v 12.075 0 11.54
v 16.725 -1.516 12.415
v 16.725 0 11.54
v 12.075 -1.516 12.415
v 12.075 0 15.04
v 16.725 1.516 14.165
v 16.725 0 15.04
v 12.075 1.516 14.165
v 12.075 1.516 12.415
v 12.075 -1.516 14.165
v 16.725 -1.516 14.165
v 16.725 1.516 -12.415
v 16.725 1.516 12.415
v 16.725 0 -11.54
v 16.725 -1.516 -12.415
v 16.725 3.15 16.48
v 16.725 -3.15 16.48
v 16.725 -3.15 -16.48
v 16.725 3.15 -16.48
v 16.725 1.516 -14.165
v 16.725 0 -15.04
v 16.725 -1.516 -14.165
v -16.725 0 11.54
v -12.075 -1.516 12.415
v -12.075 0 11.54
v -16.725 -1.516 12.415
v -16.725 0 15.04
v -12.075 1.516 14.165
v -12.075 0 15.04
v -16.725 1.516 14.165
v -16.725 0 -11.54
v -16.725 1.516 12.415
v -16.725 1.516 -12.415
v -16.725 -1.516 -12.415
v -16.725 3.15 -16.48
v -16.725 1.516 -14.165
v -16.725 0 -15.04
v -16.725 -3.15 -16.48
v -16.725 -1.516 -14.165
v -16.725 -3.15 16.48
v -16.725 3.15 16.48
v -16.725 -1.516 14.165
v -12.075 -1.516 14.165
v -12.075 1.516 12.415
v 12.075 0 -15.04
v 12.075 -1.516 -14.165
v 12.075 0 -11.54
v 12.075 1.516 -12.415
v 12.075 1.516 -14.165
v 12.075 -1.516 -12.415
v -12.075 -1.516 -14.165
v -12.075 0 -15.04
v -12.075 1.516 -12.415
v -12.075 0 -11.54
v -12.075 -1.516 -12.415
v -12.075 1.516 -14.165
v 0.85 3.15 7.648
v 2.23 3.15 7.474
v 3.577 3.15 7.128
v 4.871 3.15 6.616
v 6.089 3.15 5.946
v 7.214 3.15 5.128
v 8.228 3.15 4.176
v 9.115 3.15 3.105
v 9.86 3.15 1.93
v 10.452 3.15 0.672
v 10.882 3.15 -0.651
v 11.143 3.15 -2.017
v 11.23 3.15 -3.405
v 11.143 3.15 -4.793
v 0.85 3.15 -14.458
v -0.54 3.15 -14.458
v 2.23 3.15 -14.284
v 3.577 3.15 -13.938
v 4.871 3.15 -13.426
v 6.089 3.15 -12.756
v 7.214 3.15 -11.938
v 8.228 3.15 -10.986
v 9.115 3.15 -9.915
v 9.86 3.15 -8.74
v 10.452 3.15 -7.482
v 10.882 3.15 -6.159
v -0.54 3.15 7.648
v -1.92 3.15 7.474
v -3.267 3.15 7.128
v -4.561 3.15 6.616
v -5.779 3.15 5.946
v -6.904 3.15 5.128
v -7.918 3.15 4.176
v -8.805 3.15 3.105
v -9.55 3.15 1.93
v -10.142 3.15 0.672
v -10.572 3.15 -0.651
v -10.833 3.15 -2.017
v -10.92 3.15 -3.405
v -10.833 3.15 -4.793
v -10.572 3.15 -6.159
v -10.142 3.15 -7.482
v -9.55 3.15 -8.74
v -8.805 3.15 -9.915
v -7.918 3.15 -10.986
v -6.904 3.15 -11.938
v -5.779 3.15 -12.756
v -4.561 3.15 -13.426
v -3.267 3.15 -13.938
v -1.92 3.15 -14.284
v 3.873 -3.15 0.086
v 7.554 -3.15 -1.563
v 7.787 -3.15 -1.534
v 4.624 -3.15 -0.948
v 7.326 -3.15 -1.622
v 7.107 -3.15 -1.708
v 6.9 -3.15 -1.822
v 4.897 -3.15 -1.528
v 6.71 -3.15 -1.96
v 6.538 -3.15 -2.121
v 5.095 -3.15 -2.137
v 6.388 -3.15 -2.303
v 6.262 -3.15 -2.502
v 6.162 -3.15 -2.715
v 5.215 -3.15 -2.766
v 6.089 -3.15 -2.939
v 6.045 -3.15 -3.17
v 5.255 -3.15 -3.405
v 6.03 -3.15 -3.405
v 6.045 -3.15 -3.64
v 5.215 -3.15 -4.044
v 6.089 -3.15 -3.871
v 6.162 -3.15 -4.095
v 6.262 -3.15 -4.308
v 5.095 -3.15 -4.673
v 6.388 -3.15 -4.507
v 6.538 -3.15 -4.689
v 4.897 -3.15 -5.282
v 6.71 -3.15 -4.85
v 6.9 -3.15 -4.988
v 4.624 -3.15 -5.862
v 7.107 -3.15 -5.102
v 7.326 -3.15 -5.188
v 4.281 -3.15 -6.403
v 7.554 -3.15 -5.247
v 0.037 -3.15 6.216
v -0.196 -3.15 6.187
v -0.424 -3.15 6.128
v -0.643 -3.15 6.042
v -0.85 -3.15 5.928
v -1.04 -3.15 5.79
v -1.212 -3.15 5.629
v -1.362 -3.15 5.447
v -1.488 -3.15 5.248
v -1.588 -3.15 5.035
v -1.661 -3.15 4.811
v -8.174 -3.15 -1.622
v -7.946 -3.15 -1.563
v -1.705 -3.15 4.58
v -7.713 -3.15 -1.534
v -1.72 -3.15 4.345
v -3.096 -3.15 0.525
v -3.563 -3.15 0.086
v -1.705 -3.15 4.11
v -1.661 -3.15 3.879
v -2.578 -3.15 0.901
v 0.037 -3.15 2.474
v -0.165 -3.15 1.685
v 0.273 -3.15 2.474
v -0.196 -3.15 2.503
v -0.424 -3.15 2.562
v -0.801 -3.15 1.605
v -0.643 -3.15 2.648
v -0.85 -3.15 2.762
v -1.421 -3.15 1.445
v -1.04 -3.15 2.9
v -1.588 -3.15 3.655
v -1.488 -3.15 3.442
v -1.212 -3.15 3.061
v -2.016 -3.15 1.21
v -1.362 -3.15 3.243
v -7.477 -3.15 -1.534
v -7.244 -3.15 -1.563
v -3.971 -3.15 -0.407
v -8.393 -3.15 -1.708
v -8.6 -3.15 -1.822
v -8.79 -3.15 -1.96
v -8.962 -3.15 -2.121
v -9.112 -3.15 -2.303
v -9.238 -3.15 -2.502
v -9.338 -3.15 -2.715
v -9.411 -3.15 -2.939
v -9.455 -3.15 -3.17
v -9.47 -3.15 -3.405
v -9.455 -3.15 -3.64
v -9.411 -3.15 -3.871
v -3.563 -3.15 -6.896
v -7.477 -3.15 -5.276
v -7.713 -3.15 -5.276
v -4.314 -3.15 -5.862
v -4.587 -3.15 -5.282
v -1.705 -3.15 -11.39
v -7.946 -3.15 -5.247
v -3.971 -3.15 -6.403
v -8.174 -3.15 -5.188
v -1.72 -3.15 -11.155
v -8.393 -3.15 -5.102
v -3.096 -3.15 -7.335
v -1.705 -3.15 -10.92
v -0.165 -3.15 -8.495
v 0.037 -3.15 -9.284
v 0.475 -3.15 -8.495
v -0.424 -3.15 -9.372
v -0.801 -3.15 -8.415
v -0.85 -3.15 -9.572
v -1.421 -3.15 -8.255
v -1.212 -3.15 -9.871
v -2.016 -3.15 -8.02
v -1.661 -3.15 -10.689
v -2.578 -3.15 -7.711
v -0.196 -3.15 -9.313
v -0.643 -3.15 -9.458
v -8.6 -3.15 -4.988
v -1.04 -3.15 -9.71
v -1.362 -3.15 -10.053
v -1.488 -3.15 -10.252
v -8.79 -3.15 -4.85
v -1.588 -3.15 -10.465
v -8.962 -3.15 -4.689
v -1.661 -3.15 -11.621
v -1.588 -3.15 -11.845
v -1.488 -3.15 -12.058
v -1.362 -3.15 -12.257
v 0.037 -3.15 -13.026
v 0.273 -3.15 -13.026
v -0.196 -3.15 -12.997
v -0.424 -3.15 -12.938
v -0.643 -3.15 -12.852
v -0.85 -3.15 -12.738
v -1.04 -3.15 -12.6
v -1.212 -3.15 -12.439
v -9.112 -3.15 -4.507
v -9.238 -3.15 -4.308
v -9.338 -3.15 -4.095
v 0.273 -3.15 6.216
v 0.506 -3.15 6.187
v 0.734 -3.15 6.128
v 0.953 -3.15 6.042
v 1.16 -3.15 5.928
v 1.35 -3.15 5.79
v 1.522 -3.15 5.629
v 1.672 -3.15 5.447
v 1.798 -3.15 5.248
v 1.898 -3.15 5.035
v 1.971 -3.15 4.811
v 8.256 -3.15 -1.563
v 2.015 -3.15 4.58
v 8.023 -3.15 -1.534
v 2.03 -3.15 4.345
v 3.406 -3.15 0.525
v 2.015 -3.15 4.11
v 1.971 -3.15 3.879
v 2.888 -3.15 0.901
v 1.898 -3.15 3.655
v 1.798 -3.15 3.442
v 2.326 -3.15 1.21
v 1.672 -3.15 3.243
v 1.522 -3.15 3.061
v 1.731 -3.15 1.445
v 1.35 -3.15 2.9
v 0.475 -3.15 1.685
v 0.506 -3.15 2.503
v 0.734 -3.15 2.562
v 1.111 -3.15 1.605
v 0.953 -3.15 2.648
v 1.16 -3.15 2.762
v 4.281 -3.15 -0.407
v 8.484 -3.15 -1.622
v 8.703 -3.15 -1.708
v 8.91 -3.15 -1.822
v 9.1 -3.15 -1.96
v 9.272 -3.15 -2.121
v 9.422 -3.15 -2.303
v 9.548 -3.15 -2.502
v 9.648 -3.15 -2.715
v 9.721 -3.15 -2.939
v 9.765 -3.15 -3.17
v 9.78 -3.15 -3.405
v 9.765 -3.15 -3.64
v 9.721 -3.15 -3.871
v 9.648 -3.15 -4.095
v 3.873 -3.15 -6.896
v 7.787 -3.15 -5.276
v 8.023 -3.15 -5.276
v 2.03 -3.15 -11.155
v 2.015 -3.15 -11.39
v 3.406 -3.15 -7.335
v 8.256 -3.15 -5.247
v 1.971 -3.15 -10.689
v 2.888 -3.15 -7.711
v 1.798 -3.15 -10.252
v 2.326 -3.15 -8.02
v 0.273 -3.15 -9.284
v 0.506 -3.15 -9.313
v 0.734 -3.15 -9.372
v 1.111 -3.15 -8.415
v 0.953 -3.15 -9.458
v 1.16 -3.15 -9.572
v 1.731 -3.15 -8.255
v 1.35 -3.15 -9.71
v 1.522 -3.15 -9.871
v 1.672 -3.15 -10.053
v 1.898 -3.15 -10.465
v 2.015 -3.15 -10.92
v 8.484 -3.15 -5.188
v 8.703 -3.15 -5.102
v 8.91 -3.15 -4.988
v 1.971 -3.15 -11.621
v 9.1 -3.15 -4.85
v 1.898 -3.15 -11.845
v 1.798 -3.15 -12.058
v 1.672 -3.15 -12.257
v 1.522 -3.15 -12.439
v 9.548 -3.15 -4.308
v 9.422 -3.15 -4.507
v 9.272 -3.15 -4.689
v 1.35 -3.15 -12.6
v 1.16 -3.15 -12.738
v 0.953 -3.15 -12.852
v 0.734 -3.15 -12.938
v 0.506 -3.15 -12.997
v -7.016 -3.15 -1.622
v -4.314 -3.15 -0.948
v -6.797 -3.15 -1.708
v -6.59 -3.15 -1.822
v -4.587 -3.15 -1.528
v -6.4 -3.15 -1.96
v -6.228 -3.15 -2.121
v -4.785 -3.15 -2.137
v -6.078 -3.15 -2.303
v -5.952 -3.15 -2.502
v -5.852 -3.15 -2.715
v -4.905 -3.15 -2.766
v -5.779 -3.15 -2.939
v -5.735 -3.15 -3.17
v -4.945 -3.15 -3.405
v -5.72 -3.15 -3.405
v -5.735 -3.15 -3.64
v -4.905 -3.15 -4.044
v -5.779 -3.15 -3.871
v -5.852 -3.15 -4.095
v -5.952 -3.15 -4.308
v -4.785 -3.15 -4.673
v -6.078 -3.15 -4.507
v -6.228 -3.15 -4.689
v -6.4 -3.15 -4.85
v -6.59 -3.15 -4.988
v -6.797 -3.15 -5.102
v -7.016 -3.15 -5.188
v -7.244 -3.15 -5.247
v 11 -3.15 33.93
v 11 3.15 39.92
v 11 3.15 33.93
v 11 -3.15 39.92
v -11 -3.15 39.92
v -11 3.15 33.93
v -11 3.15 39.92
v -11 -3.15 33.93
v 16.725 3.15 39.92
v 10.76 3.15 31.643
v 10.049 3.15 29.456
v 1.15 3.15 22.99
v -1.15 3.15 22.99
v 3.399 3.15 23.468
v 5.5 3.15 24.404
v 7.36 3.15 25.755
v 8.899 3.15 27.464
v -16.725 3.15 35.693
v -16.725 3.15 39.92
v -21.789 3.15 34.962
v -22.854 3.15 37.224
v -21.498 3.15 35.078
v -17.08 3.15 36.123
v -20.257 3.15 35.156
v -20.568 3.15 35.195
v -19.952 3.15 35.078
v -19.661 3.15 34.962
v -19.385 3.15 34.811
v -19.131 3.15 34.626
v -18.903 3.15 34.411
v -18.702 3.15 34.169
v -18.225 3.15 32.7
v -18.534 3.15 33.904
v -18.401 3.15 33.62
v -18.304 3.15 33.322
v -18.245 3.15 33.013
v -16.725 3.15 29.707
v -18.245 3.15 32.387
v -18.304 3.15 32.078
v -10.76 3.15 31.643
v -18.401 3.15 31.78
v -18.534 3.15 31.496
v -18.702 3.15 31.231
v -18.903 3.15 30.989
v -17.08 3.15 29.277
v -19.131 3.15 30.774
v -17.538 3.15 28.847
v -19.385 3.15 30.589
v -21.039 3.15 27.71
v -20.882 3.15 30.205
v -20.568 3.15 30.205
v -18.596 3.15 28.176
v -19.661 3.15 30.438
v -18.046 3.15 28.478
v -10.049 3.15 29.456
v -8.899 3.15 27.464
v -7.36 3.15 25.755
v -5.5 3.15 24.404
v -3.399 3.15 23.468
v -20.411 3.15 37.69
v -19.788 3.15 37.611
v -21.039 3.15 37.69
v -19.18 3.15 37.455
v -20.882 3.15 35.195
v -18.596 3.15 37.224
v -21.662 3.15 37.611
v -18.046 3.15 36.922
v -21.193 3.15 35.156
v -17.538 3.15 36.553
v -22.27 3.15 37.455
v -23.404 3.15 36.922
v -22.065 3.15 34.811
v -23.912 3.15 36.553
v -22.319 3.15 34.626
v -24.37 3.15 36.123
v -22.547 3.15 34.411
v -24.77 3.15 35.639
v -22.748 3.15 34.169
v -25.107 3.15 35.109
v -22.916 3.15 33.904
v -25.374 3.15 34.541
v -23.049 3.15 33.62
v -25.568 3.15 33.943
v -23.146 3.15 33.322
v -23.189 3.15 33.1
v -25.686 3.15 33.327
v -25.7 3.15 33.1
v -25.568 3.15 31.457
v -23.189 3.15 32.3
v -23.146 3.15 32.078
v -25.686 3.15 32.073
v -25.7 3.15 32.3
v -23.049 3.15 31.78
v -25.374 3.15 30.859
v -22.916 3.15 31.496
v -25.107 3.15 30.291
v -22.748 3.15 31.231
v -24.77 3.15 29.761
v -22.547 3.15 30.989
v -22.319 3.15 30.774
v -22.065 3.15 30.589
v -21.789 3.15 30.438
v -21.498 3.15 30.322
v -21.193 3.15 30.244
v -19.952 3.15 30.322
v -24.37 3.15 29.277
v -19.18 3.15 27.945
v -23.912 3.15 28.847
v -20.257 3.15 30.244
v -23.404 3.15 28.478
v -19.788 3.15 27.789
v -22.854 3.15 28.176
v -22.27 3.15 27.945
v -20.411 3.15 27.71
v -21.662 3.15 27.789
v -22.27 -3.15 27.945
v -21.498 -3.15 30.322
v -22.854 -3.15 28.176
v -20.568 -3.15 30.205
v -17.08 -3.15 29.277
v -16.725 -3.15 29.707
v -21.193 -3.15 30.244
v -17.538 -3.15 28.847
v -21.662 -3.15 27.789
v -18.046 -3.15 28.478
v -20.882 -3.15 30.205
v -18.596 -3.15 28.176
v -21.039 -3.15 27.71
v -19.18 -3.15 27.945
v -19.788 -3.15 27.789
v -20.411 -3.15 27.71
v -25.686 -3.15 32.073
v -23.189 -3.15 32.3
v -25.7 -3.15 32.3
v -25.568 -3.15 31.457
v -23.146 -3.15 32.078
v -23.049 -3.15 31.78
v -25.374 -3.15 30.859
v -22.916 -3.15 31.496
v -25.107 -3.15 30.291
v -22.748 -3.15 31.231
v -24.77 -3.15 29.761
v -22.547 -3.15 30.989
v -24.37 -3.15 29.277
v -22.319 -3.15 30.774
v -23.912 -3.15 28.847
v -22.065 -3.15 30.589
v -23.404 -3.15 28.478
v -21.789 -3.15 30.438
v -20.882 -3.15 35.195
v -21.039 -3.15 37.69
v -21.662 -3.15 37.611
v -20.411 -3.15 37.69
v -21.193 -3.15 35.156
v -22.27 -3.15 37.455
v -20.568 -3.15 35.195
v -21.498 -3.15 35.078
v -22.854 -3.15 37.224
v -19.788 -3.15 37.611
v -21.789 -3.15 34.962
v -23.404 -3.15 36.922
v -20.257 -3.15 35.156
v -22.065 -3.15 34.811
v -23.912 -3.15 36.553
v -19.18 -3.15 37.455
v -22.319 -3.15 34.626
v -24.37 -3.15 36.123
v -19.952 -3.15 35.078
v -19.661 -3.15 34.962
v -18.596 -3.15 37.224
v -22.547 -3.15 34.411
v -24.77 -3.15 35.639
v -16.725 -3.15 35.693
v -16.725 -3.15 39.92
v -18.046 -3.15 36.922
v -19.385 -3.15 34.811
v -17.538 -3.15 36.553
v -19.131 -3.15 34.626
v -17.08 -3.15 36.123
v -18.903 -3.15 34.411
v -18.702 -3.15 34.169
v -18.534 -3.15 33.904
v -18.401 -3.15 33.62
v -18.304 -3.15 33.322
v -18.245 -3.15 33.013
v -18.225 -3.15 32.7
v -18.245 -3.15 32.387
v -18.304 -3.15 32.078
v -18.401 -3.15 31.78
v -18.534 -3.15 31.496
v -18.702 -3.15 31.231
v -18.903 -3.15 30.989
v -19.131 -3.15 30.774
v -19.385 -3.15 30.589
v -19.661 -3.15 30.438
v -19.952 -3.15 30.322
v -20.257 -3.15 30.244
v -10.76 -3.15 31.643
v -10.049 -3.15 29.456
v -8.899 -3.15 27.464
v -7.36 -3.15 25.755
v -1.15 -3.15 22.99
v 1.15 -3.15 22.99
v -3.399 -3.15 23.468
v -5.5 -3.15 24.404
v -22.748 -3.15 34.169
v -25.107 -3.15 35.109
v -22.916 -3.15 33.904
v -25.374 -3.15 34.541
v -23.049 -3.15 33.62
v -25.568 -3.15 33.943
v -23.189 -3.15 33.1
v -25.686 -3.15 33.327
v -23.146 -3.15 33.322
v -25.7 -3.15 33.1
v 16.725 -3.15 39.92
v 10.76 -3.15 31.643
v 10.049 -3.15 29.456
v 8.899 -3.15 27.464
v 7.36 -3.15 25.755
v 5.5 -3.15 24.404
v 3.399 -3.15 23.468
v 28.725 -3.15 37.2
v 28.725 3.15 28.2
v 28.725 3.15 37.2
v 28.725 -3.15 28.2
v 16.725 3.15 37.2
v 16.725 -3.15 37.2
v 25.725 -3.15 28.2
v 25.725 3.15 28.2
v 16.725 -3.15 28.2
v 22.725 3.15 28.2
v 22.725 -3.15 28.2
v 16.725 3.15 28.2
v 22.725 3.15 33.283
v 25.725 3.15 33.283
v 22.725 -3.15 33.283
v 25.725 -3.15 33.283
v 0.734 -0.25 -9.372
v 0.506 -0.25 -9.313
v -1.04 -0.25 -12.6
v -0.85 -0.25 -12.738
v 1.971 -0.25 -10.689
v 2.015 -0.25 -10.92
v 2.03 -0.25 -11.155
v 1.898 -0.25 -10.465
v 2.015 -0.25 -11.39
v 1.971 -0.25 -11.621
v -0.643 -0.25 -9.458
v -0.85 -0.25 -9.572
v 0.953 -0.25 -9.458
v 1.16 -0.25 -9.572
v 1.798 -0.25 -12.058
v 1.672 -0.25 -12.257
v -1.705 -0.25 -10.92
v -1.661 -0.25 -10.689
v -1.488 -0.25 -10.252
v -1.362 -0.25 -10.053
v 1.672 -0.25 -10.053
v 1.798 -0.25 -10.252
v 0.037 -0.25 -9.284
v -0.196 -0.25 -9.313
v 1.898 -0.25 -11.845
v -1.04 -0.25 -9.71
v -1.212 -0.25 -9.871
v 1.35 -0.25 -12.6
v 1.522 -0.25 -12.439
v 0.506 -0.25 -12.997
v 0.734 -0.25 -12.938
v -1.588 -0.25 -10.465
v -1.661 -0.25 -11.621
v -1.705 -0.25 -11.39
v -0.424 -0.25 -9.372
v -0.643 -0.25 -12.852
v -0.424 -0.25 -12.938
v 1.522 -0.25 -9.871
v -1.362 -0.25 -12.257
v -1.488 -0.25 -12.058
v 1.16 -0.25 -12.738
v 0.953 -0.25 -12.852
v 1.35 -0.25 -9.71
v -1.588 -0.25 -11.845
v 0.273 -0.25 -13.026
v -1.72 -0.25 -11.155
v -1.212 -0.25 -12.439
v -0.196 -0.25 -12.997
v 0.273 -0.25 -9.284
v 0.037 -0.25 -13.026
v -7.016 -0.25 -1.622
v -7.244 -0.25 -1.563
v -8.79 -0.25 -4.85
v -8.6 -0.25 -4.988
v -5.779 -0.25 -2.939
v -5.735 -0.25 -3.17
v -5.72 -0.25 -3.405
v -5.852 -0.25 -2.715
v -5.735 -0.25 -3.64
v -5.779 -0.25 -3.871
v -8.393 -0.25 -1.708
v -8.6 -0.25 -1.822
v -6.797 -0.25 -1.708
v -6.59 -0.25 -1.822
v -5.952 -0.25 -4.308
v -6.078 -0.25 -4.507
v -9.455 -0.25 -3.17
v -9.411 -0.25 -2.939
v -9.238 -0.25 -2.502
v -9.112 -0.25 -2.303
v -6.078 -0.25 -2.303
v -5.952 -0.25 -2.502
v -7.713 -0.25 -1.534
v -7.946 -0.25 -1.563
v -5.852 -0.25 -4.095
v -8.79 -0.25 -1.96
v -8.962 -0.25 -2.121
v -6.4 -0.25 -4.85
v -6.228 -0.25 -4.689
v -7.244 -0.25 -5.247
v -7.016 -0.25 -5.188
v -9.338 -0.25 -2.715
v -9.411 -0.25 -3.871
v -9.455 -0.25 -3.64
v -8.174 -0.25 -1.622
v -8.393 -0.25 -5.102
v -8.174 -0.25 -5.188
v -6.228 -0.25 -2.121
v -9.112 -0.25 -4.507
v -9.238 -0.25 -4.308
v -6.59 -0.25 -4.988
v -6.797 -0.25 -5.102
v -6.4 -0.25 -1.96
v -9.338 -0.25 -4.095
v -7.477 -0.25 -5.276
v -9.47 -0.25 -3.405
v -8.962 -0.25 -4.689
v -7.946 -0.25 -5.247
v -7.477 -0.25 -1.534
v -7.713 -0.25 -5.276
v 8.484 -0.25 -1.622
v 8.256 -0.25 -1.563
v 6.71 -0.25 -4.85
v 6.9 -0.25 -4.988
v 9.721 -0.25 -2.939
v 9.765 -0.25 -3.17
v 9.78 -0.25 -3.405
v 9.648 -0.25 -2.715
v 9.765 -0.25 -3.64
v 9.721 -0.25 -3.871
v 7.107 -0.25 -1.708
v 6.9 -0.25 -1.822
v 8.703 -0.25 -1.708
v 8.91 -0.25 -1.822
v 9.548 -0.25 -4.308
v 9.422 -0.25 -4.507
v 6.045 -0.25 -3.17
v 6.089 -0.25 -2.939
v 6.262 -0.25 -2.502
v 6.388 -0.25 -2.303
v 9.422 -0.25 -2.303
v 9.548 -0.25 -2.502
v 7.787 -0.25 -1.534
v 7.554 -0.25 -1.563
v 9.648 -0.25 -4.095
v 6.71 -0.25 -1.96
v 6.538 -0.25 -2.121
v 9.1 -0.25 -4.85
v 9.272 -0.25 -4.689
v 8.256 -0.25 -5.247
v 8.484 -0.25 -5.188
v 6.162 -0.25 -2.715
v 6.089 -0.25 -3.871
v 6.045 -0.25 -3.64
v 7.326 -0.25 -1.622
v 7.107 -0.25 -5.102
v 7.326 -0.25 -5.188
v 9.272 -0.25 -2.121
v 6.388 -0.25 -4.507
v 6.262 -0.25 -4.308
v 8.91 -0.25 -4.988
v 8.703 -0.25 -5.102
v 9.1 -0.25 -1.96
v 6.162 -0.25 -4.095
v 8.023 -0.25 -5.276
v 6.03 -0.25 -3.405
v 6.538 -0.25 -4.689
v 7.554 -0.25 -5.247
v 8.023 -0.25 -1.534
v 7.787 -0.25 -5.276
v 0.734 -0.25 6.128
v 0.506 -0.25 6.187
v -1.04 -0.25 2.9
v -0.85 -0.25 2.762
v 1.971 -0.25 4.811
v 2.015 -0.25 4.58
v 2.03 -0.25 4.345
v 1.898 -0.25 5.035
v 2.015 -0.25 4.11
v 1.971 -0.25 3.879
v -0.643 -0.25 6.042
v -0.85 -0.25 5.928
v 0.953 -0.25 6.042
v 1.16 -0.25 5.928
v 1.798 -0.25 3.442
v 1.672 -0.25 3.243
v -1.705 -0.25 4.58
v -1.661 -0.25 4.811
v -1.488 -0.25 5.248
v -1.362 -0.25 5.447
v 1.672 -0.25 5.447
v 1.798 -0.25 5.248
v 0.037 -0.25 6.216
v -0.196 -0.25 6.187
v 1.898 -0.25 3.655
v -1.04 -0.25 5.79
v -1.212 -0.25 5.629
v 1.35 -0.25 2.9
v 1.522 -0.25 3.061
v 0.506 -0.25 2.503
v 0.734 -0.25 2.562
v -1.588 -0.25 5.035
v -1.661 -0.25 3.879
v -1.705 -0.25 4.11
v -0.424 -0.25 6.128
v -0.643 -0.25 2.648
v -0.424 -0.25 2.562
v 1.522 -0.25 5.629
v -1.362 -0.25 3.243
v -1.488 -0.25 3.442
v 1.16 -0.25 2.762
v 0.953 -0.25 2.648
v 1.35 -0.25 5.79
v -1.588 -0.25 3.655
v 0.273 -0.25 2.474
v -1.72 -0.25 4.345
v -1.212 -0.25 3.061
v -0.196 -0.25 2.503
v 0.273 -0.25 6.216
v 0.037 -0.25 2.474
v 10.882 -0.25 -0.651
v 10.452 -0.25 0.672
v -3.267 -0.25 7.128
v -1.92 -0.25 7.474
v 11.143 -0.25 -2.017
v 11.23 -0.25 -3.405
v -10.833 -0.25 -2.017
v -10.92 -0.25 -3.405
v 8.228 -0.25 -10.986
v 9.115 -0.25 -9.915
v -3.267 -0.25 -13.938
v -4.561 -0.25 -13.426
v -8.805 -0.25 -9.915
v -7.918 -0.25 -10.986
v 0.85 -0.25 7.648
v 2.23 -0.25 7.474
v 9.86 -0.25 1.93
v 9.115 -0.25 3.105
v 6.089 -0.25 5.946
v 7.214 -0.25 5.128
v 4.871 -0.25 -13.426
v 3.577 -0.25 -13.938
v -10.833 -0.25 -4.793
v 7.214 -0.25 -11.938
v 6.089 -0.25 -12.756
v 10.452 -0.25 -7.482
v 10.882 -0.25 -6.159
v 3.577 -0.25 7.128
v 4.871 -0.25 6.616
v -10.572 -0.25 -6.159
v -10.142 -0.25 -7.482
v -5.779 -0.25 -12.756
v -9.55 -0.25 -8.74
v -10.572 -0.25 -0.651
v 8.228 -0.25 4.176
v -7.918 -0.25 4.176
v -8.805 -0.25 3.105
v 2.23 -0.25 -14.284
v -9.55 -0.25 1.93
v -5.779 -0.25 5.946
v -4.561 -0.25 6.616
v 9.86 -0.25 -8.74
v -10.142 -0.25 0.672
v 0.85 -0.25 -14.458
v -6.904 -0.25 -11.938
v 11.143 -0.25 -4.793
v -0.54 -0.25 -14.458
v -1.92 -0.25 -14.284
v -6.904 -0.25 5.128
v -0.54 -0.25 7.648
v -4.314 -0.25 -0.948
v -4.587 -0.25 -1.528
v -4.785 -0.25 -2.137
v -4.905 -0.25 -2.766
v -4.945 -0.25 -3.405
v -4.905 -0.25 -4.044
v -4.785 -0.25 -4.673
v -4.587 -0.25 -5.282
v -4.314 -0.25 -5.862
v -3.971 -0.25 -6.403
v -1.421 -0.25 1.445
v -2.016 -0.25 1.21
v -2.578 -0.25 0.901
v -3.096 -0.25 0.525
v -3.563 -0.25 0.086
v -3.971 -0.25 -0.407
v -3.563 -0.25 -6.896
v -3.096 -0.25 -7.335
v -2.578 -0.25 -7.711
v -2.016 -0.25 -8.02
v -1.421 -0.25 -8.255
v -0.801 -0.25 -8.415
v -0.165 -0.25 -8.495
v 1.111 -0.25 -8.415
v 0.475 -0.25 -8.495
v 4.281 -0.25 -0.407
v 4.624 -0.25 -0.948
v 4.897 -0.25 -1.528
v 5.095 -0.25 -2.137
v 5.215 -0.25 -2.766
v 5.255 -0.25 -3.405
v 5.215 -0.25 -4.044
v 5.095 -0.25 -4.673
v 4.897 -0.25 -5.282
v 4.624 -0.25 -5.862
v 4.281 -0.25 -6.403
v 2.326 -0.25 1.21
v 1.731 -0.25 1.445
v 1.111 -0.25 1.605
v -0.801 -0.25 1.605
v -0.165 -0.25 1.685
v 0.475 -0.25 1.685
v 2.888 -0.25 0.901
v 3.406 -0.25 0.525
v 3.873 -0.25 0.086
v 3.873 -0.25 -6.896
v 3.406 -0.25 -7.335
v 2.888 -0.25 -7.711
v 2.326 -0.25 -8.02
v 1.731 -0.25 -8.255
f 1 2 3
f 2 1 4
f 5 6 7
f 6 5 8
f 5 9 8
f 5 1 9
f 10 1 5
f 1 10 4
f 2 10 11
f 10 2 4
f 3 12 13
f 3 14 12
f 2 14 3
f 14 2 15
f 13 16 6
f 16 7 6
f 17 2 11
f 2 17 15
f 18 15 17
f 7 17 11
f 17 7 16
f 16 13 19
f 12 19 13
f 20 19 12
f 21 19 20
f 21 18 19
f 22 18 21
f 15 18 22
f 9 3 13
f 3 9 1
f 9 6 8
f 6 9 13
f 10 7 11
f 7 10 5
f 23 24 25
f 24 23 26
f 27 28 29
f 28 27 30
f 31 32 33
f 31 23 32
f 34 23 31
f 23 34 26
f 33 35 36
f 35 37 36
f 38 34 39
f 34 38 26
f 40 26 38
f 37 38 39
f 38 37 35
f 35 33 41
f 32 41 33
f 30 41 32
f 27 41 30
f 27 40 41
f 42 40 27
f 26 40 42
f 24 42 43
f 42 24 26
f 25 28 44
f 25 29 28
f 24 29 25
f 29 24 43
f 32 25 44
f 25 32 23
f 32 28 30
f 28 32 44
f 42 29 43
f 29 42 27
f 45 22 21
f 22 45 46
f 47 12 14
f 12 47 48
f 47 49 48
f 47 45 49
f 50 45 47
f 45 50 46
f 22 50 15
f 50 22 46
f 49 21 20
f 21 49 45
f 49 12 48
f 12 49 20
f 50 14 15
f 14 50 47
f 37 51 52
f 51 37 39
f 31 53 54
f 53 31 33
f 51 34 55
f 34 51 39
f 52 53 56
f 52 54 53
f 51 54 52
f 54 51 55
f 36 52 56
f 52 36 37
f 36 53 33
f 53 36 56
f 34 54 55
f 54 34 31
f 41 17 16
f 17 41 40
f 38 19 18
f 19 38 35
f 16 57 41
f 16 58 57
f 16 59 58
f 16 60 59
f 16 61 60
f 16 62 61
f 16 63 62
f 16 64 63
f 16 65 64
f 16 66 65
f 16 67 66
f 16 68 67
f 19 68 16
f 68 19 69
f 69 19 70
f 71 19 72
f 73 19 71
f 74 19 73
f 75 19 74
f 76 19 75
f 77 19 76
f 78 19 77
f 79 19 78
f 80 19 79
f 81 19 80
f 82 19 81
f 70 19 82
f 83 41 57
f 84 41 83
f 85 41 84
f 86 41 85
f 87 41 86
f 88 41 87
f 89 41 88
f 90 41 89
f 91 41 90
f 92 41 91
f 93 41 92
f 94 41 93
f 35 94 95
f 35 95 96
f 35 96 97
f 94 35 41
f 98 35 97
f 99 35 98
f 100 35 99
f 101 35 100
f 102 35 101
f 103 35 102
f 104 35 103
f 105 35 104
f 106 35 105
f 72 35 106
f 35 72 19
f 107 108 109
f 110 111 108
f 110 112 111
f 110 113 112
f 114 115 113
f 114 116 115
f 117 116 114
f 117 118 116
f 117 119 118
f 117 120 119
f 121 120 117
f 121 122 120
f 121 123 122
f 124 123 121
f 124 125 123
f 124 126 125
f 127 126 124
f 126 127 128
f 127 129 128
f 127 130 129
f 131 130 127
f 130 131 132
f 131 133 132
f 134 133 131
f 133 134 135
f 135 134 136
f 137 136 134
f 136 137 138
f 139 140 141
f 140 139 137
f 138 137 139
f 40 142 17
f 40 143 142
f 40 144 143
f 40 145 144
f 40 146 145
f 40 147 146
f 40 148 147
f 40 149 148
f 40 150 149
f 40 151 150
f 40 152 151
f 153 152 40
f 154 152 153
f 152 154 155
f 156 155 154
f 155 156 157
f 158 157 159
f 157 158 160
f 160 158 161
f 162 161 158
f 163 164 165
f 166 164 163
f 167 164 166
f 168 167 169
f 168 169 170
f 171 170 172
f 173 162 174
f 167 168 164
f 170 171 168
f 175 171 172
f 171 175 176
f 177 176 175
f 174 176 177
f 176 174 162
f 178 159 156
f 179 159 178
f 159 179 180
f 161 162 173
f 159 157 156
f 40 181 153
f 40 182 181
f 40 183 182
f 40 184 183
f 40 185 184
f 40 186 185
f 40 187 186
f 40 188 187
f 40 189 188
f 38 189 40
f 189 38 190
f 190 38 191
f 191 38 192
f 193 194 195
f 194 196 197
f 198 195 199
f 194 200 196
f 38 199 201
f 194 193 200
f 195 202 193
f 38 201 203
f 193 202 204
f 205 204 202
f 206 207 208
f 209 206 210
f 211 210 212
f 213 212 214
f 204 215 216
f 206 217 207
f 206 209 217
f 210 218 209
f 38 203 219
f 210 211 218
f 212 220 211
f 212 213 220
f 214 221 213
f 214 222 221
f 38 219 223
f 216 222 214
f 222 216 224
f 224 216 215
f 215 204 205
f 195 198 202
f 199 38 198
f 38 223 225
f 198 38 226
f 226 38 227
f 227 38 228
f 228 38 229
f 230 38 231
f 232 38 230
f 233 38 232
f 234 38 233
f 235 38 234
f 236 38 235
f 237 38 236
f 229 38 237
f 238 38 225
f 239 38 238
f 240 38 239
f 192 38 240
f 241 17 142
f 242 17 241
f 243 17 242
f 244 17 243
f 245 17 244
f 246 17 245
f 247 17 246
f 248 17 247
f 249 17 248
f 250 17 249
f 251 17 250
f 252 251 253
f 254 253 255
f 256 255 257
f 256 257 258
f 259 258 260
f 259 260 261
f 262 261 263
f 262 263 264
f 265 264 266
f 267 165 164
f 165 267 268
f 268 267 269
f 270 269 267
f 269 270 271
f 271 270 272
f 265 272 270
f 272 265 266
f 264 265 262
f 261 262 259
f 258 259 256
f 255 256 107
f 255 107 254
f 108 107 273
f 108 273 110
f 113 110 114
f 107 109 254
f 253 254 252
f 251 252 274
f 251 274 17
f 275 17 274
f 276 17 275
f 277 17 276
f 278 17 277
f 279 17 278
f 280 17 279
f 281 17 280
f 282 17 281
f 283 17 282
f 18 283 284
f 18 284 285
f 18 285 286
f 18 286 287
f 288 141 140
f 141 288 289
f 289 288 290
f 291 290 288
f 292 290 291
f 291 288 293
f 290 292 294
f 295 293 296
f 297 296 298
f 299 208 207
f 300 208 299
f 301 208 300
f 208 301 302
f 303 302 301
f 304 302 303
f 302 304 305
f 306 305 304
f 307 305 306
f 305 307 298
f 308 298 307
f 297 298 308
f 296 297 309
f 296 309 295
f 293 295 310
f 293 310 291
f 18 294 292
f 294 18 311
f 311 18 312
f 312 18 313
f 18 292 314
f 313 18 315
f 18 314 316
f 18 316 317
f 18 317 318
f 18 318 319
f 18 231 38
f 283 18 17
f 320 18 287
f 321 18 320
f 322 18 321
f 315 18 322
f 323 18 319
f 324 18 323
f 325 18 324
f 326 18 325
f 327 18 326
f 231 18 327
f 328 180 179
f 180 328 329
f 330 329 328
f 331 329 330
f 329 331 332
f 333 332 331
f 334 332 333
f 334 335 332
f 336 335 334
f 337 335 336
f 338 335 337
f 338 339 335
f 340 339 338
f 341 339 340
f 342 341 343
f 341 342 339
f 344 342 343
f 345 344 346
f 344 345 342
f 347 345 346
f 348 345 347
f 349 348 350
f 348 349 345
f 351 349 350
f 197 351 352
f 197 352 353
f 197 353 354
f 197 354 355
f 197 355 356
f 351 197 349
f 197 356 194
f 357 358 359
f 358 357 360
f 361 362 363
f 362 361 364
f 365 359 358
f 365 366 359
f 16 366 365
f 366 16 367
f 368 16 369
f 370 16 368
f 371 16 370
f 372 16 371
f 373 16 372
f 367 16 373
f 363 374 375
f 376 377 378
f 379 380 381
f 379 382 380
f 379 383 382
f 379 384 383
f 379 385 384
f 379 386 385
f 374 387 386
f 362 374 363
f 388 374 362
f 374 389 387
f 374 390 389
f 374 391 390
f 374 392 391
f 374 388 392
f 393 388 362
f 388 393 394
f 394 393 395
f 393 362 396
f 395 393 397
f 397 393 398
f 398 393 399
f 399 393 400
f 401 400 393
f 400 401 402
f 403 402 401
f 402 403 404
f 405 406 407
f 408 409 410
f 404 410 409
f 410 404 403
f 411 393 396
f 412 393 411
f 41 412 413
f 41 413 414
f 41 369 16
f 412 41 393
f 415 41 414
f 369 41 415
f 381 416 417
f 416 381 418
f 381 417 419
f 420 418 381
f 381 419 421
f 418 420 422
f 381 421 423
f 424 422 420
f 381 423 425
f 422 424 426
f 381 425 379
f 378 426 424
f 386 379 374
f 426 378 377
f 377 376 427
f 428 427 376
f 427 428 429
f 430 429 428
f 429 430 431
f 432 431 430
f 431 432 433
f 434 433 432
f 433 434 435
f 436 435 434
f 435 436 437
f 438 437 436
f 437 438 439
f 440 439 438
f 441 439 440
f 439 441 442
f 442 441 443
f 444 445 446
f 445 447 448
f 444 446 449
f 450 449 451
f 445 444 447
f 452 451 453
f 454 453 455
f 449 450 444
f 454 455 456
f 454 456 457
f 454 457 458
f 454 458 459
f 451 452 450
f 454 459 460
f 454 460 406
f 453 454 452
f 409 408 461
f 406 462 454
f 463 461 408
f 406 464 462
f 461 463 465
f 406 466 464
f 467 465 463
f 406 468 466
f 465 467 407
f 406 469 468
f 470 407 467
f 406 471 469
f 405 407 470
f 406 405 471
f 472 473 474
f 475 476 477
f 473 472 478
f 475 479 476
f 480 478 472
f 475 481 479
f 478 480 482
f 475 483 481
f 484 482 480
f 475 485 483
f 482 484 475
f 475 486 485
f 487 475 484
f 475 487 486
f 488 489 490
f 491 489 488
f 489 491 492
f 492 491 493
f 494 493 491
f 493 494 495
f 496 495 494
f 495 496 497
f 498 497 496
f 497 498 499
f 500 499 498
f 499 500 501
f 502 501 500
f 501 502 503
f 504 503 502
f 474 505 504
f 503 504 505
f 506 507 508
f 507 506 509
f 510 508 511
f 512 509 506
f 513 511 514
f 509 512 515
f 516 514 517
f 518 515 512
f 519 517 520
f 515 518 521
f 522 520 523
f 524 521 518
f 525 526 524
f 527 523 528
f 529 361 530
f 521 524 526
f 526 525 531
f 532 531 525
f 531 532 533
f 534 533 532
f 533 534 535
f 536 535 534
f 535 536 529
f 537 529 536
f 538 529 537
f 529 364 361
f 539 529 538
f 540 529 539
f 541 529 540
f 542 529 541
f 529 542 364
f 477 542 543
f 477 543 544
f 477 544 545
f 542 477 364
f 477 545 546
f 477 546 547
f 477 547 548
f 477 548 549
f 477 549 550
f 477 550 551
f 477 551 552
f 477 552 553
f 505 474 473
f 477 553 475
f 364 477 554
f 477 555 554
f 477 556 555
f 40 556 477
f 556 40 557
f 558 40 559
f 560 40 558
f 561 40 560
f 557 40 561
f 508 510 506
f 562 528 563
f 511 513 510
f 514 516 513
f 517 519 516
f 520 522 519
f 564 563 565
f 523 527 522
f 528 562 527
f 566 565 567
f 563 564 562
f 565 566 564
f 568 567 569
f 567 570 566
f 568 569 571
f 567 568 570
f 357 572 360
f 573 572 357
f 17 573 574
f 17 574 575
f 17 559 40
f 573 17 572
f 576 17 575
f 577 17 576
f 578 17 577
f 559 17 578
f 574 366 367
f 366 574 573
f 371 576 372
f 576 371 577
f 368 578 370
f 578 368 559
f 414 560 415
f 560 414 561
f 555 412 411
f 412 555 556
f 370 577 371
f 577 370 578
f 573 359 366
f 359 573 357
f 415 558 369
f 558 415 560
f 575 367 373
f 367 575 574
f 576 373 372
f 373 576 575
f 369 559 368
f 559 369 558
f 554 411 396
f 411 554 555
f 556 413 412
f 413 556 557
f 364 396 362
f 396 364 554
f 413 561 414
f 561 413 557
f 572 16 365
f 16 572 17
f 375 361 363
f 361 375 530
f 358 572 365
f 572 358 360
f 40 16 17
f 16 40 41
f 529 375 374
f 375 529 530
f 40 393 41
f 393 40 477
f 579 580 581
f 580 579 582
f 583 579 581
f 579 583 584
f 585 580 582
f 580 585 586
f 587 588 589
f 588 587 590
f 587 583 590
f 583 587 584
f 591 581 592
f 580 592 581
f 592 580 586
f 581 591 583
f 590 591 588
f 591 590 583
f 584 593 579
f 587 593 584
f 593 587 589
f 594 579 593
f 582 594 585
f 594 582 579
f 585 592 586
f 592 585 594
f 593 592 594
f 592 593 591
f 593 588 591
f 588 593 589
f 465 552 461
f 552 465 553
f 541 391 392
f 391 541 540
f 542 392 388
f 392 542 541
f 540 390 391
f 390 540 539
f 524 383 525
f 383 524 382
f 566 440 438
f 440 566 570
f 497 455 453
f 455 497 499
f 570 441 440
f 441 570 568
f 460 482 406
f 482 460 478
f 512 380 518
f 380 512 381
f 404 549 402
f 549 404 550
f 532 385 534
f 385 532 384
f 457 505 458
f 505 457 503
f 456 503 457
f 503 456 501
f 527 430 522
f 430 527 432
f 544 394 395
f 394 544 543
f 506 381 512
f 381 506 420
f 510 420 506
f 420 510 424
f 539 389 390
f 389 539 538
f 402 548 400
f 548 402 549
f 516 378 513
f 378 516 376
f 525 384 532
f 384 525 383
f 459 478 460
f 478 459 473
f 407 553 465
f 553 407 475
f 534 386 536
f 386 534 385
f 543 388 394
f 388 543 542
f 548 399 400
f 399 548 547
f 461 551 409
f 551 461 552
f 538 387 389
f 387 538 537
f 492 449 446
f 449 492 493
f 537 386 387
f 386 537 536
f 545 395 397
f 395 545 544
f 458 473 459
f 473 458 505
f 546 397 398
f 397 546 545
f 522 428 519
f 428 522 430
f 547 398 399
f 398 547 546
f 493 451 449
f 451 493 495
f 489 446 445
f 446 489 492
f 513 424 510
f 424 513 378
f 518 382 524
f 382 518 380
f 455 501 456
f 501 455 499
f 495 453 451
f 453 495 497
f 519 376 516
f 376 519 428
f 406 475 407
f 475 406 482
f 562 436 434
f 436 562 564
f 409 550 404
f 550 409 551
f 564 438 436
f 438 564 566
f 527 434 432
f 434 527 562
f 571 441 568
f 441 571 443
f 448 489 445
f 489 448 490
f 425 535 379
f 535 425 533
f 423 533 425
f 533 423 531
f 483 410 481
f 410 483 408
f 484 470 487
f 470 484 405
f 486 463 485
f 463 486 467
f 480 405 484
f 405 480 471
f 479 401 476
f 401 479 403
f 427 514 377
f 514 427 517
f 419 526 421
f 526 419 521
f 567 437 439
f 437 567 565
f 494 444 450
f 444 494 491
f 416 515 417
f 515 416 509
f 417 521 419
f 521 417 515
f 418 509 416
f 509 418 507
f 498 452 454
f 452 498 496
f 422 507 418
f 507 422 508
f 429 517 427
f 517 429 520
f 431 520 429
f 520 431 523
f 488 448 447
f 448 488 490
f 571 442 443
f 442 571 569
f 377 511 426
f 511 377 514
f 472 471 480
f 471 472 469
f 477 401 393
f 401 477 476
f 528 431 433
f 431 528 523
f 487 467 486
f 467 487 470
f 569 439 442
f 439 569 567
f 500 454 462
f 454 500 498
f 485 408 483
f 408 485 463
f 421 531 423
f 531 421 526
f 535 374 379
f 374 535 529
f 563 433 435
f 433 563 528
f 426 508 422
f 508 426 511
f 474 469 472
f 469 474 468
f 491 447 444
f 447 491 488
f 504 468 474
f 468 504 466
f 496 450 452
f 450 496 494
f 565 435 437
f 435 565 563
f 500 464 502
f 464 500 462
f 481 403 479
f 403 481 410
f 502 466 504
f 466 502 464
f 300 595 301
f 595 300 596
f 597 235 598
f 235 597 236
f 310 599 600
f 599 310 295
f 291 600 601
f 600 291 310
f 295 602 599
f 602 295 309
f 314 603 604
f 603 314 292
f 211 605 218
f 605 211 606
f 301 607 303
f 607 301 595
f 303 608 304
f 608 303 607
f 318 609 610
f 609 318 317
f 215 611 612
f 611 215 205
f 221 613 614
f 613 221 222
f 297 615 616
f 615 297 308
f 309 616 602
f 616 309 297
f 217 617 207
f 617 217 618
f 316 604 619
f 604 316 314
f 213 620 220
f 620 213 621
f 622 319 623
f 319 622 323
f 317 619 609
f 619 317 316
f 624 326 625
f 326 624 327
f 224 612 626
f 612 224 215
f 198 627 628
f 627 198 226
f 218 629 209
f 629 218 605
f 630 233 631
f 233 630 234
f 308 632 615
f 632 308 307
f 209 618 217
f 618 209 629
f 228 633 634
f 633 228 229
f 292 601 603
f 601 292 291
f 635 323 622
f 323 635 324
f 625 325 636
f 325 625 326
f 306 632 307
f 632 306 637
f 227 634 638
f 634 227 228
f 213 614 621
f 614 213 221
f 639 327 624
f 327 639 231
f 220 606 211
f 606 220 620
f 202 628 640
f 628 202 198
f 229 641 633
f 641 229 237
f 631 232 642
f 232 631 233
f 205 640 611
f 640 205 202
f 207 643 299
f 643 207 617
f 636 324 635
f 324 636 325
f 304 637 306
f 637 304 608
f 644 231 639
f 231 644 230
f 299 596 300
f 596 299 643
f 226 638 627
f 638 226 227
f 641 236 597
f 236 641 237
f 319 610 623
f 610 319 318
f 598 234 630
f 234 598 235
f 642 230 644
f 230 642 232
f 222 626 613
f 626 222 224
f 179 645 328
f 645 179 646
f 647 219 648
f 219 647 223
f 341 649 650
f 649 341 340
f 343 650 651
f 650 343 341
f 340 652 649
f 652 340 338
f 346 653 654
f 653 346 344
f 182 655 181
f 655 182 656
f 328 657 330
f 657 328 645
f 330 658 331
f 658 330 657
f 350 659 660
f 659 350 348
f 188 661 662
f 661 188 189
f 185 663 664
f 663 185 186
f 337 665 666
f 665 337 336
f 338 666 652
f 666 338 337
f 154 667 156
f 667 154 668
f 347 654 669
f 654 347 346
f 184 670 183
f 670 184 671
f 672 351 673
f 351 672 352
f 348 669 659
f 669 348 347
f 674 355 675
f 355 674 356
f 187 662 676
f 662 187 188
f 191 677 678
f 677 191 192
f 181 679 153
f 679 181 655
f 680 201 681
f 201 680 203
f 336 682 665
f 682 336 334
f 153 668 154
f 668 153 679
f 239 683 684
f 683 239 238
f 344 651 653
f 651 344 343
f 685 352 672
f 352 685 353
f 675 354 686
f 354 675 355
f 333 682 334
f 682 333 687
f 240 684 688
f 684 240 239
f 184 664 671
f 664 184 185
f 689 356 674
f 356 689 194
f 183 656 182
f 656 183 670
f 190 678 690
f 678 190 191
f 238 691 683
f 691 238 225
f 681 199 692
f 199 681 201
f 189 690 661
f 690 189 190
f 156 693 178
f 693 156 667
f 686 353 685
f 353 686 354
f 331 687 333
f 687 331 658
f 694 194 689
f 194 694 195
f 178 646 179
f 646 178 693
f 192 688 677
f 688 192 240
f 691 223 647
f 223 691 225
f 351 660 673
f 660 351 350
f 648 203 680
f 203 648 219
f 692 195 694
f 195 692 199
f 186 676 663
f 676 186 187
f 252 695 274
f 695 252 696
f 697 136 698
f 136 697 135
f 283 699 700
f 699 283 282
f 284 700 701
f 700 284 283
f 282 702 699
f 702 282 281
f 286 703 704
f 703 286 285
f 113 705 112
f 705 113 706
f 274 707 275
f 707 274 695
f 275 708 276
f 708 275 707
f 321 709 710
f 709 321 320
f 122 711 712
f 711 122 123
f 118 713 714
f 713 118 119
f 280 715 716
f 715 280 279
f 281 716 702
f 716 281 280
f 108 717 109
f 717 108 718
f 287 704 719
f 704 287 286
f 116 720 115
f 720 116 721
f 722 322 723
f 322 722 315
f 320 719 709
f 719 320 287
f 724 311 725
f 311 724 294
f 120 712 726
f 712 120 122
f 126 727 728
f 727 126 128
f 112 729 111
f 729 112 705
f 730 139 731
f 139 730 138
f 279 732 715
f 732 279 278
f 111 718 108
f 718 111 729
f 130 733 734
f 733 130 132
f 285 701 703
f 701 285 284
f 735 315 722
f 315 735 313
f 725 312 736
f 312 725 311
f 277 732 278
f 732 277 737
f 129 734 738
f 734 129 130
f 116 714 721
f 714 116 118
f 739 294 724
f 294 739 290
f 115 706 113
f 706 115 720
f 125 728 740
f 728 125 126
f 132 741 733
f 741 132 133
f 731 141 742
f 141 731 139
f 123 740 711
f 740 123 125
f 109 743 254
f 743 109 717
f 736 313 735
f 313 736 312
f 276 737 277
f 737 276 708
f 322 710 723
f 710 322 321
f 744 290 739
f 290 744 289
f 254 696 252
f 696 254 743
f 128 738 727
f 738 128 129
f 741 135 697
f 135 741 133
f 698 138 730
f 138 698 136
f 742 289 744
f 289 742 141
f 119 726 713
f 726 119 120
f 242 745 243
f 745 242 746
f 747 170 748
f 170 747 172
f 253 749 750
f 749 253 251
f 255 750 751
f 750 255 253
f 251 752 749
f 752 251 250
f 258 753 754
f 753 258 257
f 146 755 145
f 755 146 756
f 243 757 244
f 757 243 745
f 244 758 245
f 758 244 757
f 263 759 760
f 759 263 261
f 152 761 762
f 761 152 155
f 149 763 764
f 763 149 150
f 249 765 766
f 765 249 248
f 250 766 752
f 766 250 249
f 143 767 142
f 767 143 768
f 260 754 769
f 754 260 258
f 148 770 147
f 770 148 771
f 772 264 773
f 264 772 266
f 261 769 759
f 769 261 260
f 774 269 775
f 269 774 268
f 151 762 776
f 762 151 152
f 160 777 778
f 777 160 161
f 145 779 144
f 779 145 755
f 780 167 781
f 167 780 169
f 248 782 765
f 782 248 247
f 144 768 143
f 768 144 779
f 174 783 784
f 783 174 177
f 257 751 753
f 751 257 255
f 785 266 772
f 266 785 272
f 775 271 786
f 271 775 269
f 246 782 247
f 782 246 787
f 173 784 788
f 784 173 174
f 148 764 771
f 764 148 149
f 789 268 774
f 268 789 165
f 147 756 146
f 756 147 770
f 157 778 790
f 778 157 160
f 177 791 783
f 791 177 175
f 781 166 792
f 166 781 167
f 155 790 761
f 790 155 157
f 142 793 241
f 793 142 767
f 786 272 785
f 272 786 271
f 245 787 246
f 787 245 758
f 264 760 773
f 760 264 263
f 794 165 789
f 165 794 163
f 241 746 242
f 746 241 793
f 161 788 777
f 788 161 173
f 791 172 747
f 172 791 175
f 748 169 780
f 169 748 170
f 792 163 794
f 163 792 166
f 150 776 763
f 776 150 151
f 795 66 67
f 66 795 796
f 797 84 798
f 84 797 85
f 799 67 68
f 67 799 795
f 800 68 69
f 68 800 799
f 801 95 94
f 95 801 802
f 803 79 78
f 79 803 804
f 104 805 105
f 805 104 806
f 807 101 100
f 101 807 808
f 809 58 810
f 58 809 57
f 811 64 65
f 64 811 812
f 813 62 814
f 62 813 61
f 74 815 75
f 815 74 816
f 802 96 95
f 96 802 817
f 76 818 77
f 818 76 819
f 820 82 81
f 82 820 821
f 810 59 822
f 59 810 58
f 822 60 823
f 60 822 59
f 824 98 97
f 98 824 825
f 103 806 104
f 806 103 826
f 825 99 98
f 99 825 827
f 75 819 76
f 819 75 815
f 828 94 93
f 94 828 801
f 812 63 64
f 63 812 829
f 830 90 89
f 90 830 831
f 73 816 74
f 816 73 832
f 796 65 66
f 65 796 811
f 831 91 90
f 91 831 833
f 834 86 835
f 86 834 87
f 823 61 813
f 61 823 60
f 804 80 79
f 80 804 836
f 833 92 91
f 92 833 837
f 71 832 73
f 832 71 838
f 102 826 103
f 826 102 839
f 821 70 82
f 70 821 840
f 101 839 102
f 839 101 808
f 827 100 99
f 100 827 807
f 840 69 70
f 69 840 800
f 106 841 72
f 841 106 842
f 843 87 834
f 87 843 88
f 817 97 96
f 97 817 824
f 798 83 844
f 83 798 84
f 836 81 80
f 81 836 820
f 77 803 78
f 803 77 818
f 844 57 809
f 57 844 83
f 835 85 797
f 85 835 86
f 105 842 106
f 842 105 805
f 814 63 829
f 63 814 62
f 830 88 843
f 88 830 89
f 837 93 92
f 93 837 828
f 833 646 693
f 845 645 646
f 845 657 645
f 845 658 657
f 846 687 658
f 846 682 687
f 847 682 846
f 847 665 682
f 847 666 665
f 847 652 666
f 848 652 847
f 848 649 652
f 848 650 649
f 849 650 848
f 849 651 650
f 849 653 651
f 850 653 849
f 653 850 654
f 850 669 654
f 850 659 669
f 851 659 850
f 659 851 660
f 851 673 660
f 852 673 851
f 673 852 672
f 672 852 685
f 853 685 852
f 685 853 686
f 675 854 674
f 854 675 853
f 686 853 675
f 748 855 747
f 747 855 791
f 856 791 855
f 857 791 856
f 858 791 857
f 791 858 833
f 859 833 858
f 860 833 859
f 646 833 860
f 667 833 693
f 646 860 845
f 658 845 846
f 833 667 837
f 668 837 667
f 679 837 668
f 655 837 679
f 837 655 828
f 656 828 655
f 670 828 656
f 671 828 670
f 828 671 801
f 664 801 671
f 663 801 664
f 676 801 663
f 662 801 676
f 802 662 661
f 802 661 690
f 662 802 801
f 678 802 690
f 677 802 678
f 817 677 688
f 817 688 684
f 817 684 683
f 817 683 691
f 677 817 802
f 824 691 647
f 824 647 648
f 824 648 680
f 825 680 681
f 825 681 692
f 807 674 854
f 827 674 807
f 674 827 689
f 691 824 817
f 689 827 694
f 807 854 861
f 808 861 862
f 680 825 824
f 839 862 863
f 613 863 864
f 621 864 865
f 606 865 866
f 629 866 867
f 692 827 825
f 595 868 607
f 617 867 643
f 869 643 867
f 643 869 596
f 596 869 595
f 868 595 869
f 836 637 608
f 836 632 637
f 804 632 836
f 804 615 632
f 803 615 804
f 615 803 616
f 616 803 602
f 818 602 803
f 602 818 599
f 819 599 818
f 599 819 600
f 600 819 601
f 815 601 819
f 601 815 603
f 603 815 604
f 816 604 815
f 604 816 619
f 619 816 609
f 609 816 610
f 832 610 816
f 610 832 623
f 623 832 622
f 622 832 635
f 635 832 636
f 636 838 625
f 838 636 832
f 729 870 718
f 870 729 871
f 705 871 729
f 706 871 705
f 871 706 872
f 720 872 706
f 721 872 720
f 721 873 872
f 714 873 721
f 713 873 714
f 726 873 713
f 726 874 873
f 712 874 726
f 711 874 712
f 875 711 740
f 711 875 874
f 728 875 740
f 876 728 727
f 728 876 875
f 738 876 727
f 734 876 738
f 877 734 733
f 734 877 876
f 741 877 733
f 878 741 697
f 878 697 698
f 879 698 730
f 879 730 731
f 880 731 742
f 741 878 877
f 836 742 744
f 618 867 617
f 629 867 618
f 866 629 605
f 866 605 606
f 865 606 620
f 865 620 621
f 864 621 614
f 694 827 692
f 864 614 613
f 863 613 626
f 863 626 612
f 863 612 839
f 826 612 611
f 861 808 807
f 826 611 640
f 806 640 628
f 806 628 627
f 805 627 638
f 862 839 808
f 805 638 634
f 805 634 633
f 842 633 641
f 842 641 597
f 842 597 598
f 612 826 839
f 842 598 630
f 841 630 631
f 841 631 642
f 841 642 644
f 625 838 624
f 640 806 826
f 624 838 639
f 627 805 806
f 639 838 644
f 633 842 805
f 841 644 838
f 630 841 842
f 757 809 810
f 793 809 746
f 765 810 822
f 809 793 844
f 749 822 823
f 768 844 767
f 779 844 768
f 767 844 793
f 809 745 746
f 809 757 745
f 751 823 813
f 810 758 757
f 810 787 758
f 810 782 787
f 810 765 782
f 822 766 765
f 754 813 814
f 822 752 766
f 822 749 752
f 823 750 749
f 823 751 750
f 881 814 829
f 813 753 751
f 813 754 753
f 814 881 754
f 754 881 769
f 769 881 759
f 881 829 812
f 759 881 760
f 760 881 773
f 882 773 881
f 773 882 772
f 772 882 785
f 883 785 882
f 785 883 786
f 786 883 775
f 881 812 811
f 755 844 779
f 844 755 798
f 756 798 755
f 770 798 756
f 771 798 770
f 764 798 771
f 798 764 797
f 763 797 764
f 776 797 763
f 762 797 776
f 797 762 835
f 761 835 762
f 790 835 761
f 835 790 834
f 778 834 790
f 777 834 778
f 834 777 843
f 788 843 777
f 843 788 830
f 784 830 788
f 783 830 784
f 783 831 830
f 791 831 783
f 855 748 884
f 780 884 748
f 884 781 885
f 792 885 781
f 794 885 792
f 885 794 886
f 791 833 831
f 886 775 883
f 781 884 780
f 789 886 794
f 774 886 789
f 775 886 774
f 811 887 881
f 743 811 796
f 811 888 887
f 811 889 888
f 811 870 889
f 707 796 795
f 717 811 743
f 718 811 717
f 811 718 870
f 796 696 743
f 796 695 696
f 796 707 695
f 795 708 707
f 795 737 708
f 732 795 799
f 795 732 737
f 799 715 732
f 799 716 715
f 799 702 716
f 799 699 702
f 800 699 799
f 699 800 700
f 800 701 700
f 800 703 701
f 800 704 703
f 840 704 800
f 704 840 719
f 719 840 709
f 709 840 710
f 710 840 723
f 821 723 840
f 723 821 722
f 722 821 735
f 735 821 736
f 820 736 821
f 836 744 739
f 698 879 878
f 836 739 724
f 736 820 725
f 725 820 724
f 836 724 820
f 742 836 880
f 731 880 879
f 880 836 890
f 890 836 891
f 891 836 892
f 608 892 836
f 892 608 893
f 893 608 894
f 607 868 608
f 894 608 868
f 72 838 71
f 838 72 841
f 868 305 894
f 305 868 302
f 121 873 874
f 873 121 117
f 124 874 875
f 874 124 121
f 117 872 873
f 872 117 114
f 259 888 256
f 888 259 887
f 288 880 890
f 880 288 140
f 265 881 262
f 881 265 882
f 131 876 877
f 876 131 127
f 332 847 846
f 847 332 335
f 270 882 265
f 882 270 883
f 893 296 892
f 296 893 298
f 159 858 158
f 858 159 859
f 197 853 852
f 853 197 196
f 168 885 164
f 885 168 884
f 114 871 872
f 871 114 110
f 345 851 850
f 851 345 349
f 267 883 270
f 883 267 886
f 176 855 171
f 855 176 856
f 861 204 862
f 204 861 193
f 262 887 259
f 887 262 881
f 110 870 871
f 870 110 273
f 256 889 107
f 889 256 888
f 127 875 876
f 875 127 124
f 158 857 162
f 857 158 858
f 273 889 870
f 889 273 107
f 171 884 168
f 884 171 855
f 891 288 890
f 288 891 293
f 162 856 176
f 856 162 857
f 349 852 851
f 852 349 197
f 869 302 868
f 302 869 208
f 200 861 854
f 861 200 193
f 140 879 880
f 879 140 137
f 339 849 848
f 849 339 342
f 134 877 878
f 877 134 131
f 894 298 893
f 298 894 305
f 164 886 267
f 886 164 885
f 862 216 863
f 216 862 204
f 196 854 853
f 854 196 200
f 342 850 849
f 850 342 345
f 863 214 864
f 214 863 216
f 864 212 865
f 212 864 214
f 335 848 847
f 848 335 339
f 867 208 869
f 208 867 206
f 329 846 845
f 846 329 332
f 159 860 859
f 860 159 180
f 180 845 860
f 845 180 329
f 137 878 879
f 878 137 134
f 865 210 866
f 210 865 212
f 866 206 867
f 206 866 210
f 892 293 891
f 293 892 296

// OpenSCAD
pumpHolderWidth=50.25;
pumpHolderHeight=38.17;
pumpHolderThickness=10.15;


semiCircleDiameter=22; //16.36;
semiCircleRadius=semiCircleDiameter/2;

semiCircleHeight=26.54;
semiCircleThickness=7.23;


//difference(){
//    cube([pumpHolderWidth,pumpHolderThickness,pumpHolderHeight],center=true);
//
//    translate([0,(pumpHolderThickness/2)-(semiCircleThickness/2)+.001,(pumpHolderHeight/2) - (semiCircleHeight/2)]) color("red") union(){
//    rotate([90,0,0]) cylinder(h=pumpHolderThickness+5,r=semiCircleRadius, center=true);
//
//    color("red") translate([0,0,(semiCircleHeight/2)/2]) cube([semiCircleDiameter,pumpHolderThickness+5,semiCircleHeight/2],center=true);
//    }
//}

recHeight=32.96;
recWidth=33.45;
recThickness=6.3;

sideScrewDiameter=3.5;
sideScrewRadius=sideScrewDiameter/2;
sideScrewDepth=4.65;



cubeShape=6.38;


topPlateHeight= 23.44;//1.45;
topPlateOffset = 1.45;

module sideScrew(){
    cylinder(h=sideScrewDepth,r=sideScrewRadius,center=true);
}

module makeFourSideScrews(){
union(){
color("red") translate([(recWidth/2)-(sideScrewDepth/2),0,(recHeight/2) - (cubeShape/2)]) rotate([0,090,0]) sideScrew();
color("red") translate([-((recWidth/2)-(sideScrewDepth/2)),0,(recHeight/2) - (cubeShape/2)]) rotate([0,090,0]) sideScrew();

color("red") translate([((recWidth/2)-(sideScrewDepth/2)),0,-((recHeight/2) - (cubeShape/2))]) rotate([0,090,0]) sideScrew();
color("red") translate([-((recWidth/2)-(sideScrewDepth/2)),0,-((recHeight/2) - (cubeShape/2))]) rotate([0,090,0]) sideScrew();   
}

}




module endPieceBlock(){
difference(){
cube([recWidth,recThickness,recHeight],center=true);
makeFourSideScrews();
}
}


hookWidth=12;//7.40;
hookHeight=7;
hookThickness=5;

stopperWidth=(1/2)*hookWidth;
stopperHeight=(1/2)*hookHeight;


module recStopper(){
//difference(){
//    //hookHeight+2
//cube([hookWidth,recThickness,hookHeight+2],center=true);
//
//translate([(stopperWidth/2) + (hookWidth/2)-(stopperWidth),0,-stopperHeight/2]) union(){
//cube([stopperWidth,recThickness,stopperHeight],center=true);
//color("blue") translate([-((1/2)*stopperWidth)/2,0,2*((stopperHeight-1)/2)]) cube([(1/2)*stopperWidth,hookThickness,stopperHeight-1],center=true);
//}
//}

difference(){
cube([hookWidth,recThickness,hookHeight+2],center=true);
    translate([1.5,0,-(hookHeight/1.5)/2]) cube([hookWidth/4,recThickness,hookHeight/1.2],center=true);
}
}




module circleStopper(){
difference(){
rotate([90,0,0]) cylinder(h=recThickness,r=5,center=true,$fn=50);
union(){
rotate([90,0,0]) cylinder(h=recThickness,r=2.5,center=true,$fn=50);
translate([-(2.5/2)-(2.5),0,0]) cube([2.5+.1,recThickness,0.8],center=true);
}
}
}

module pumpHolder(){
translate([0,0,(topPlateHeight/2) + recHeight/2]) union(){
difference(){
    color("red") cube([recWidth,recThickness,topPlateHeight],center=true);

translate([0,0,-(topPlateHeight/2)+(semiCircleRadius) +topPlateOffset+5]) union(){
translate([0,0, semiCircleRadius/2]) cube([semiCircleDiameter,recThickness,semiCircleRadius],center=true); //topPlateHeight/2+5
rotate([90,0,0]) cylinder(h=recThickness,r=semiCircleRadius,center=true);
}

}
union(){
translate([(hookWidth/2)+(recWidth/2),0,((hookHeight+2)/2)]) recStopper();

translate([-5 - (recWidth/2) +1,0,((hookHeight+2)/2)]) circleStopper();
}
}
}



module endPiece(){
    union(){
        endPieceBlock();
        pumpHolder();
    }
}



difference(){

    endPiece();
       height=59.35 - 2.4;
width=47.60;
thickness=10.65;

topWidth=38.29;
topHeight=23.70;
bottomWidth=31.10;
bottomHeight=height-topHeight;
thickness3=6.57;



diameter=28.88;



circleThickness=2;
radius=diameter/2 + 1;

smallRecHeight=8.38;
smallRecWidth=3.33;
cuttingWidth=23.59;
cuttingHeight=14.69;
extraHeight = (height - (smallRecHeight + cuttingHeight));
extraWidth = 3.63;

bigCircleDiameter=27.33;
topHalfHeight=29.63;
remaindingHeight=height-topHalfHeight;

hex_nut_diameter=7.89 + 1.6; // +1.6, 
hex_nut_radius=hex_nut_diameter/2;
hex_nut_thickness=3.85;

hex_nut_inner_diameter= 5.8;//5;
hex_nut_inner_radius=hex_nut_inner_diameter/2 + .4;



temp=(thickness/2) - (thickness - thickness3);
offsetFromCenter=19; //19.25; //1.5 // 2.3
hexNutGroveExtraDepth=2;

screwRadius=1.75;
screwDepth=9.35;

translate([-4.5,0,-17]) union(){
    rotate([90,0,0]) translate([(width/2) - (topWidth/2),-(extraHeight - (height/2) - offsetFromCenter) ,-1.5]) cylinder(d=21.95 + .2,h=3.5,$fn=50,center=true);
    
    rotate([90,0,0]) translate([(width/2) - (topWidth/2),-(extraHeight - (height/2) - offsetFromCenter),0]) cylinder(h=15,d=10 + .2 ,$fn=50,center=true);
    
    rotate([90,0,0]) union(){
translate([(width/2) - (topWidth/2),-(extraHeight - (height/2) - offsetFromCenter)-7.75 ,0]) cylinder(h=15,d=3.75,$fn=50,center=true);
translate([(width/2) - (topWidth/2) -7.75 ,-(extraHeight - (height/2) - offsetFromCenter),0]) cylinder(h=15,d=3.75,$fn=50,center=true);
translate([(width/2) - (topWidth/2) +7.75 ,-(extraHeight - (height/2) - offsetFromCenter),0]) cylinder(h=15,d=3.75,$fn=50,center=true);
translate([(width/2) - (topWidth/2) ,-(extraHeight - (height/2) - offsetFromCenter) + 7.75 ,0]) cylinder(h=15,d=3.75,$fn=50,center=true);
}
}

}


//difference(){
//    height=59.35 - 2.4;
//width=47.60;
//thickness=10.65;
//
//topWidth=38.29;
//topHeight=23.70;
//bottomWidth=31.10;
//bottomHeight=height-topHeight;
//thickness3=6.57;
//
//
//
//diameter=28.88;
//
//
//
//circleThickness=2;
//radius=diameter/2 + 1;
//
//smallRecHeight=8.38;
//smallRecWidth=3.33;
//cuttingWidth=23.59;
//cuttingHeight=14.69;
//extraHeight = (height - (smallRecHeight + cuttingHeight));
//extraWidth = 3.63;
//
//bigCircleDiameter=27.33;
//topHalfHeight=29.63;
//remaindingHeight=height-topHalfHeight;
//
//hex_nut_diameter=7.89 + 1.6; // +1.6, 
//hex_nut_radius=hex_nut_diameter/2;
//hex_nut_thickness=3.85;
//
//hex_nut_inner_diameter= 5.8;//5;
//hex_nut_inner_radius=hex_nut_inner_diameter/2 + .4;
//
//
//
//temp=(thickness/2) - (thickness - thickness3);
//offsetFromCenter=19; //19.25; //1.5 // 2.3
//hexNutGroveExtraDepth=2;
//
//screwRadius=1.75;
//screwDepth=9.35;
//difference(){
////union(){
//translate([(width/2) - (topWidth/2),-(extraHeight - (height/2) - offsetFromCenter) ,-1.5]) cylinder(d=21.95 + .2,h=3.5,$fn=50,center=true);
//    
//    translate([(width/2) - (topWidth/2),-(extraHeight - (height/2) - offsetFromCenter),0]) cylinder(h=15,d=10 + .2 ,$fn=50,center=true);
////}
//
//
//}
//
//
//
//
//union(){
//translate([(width/2) - (topWidth/2),-(extraHeight - (height/2) - offsetFromCenter)-7.75 ,0]) cylinder(h=15,d=3.75,$fn=50,center=true);
//translate([(width/2) - (topWidth/2) -7.75 ,-(extraHeight - (height/2) - offsetFromCenter),0]) cylinder(h=15,d=3.75,$fn=50,center=true);
//translate([(width/2) - (topWidth/2) +7.75 ,-(extraHeight - (height/2) - offsetFromCenter),0]) cylinder(h=15,d=3.75,$fn=50,center=true);
//translate([(width/2) - (topWidth/2) ,-(extraHeight - (height/2) - offsetFromCenter) + 7.75 ,0]) cylinder(h=15,d=3.75,$fn=50,center=true);
//}
//
//}







//difference(){
//    //hookHeight+2
//%cube([hookWidth,recThickness,hookHeight+2],center=true);
//
//translate([(stopperWidth/2) + (hookWidth/2)-(stopperWidth),0,-stopperHeight/2]) union(){
//%cube([stopperWidth,recThickness,stopperHeight],center=true);
////color("blue") translate([-((1/2)*stopperWidth)/2,0,2*((stopperHeight-1)/2)]) 
//    color("blue") cube([(1/2)*stopperWidth,hookThickness,stopperHeight-1],center=true);
//}
//}



//translate([stopperWidth/2,0,-((hookHeight+2)/4)]) %cube([stopperWidth,recThickness,(hookHeight+2)/2],center=true);
////color("blue") translate([-((1/2)*stopperWidth)/2,0,2*((stopperHeight-1)/2)]) 
//    color("blue") cube([(1/2)*stopperWidth,hookThickness,stopperHeight-1],center=true);
